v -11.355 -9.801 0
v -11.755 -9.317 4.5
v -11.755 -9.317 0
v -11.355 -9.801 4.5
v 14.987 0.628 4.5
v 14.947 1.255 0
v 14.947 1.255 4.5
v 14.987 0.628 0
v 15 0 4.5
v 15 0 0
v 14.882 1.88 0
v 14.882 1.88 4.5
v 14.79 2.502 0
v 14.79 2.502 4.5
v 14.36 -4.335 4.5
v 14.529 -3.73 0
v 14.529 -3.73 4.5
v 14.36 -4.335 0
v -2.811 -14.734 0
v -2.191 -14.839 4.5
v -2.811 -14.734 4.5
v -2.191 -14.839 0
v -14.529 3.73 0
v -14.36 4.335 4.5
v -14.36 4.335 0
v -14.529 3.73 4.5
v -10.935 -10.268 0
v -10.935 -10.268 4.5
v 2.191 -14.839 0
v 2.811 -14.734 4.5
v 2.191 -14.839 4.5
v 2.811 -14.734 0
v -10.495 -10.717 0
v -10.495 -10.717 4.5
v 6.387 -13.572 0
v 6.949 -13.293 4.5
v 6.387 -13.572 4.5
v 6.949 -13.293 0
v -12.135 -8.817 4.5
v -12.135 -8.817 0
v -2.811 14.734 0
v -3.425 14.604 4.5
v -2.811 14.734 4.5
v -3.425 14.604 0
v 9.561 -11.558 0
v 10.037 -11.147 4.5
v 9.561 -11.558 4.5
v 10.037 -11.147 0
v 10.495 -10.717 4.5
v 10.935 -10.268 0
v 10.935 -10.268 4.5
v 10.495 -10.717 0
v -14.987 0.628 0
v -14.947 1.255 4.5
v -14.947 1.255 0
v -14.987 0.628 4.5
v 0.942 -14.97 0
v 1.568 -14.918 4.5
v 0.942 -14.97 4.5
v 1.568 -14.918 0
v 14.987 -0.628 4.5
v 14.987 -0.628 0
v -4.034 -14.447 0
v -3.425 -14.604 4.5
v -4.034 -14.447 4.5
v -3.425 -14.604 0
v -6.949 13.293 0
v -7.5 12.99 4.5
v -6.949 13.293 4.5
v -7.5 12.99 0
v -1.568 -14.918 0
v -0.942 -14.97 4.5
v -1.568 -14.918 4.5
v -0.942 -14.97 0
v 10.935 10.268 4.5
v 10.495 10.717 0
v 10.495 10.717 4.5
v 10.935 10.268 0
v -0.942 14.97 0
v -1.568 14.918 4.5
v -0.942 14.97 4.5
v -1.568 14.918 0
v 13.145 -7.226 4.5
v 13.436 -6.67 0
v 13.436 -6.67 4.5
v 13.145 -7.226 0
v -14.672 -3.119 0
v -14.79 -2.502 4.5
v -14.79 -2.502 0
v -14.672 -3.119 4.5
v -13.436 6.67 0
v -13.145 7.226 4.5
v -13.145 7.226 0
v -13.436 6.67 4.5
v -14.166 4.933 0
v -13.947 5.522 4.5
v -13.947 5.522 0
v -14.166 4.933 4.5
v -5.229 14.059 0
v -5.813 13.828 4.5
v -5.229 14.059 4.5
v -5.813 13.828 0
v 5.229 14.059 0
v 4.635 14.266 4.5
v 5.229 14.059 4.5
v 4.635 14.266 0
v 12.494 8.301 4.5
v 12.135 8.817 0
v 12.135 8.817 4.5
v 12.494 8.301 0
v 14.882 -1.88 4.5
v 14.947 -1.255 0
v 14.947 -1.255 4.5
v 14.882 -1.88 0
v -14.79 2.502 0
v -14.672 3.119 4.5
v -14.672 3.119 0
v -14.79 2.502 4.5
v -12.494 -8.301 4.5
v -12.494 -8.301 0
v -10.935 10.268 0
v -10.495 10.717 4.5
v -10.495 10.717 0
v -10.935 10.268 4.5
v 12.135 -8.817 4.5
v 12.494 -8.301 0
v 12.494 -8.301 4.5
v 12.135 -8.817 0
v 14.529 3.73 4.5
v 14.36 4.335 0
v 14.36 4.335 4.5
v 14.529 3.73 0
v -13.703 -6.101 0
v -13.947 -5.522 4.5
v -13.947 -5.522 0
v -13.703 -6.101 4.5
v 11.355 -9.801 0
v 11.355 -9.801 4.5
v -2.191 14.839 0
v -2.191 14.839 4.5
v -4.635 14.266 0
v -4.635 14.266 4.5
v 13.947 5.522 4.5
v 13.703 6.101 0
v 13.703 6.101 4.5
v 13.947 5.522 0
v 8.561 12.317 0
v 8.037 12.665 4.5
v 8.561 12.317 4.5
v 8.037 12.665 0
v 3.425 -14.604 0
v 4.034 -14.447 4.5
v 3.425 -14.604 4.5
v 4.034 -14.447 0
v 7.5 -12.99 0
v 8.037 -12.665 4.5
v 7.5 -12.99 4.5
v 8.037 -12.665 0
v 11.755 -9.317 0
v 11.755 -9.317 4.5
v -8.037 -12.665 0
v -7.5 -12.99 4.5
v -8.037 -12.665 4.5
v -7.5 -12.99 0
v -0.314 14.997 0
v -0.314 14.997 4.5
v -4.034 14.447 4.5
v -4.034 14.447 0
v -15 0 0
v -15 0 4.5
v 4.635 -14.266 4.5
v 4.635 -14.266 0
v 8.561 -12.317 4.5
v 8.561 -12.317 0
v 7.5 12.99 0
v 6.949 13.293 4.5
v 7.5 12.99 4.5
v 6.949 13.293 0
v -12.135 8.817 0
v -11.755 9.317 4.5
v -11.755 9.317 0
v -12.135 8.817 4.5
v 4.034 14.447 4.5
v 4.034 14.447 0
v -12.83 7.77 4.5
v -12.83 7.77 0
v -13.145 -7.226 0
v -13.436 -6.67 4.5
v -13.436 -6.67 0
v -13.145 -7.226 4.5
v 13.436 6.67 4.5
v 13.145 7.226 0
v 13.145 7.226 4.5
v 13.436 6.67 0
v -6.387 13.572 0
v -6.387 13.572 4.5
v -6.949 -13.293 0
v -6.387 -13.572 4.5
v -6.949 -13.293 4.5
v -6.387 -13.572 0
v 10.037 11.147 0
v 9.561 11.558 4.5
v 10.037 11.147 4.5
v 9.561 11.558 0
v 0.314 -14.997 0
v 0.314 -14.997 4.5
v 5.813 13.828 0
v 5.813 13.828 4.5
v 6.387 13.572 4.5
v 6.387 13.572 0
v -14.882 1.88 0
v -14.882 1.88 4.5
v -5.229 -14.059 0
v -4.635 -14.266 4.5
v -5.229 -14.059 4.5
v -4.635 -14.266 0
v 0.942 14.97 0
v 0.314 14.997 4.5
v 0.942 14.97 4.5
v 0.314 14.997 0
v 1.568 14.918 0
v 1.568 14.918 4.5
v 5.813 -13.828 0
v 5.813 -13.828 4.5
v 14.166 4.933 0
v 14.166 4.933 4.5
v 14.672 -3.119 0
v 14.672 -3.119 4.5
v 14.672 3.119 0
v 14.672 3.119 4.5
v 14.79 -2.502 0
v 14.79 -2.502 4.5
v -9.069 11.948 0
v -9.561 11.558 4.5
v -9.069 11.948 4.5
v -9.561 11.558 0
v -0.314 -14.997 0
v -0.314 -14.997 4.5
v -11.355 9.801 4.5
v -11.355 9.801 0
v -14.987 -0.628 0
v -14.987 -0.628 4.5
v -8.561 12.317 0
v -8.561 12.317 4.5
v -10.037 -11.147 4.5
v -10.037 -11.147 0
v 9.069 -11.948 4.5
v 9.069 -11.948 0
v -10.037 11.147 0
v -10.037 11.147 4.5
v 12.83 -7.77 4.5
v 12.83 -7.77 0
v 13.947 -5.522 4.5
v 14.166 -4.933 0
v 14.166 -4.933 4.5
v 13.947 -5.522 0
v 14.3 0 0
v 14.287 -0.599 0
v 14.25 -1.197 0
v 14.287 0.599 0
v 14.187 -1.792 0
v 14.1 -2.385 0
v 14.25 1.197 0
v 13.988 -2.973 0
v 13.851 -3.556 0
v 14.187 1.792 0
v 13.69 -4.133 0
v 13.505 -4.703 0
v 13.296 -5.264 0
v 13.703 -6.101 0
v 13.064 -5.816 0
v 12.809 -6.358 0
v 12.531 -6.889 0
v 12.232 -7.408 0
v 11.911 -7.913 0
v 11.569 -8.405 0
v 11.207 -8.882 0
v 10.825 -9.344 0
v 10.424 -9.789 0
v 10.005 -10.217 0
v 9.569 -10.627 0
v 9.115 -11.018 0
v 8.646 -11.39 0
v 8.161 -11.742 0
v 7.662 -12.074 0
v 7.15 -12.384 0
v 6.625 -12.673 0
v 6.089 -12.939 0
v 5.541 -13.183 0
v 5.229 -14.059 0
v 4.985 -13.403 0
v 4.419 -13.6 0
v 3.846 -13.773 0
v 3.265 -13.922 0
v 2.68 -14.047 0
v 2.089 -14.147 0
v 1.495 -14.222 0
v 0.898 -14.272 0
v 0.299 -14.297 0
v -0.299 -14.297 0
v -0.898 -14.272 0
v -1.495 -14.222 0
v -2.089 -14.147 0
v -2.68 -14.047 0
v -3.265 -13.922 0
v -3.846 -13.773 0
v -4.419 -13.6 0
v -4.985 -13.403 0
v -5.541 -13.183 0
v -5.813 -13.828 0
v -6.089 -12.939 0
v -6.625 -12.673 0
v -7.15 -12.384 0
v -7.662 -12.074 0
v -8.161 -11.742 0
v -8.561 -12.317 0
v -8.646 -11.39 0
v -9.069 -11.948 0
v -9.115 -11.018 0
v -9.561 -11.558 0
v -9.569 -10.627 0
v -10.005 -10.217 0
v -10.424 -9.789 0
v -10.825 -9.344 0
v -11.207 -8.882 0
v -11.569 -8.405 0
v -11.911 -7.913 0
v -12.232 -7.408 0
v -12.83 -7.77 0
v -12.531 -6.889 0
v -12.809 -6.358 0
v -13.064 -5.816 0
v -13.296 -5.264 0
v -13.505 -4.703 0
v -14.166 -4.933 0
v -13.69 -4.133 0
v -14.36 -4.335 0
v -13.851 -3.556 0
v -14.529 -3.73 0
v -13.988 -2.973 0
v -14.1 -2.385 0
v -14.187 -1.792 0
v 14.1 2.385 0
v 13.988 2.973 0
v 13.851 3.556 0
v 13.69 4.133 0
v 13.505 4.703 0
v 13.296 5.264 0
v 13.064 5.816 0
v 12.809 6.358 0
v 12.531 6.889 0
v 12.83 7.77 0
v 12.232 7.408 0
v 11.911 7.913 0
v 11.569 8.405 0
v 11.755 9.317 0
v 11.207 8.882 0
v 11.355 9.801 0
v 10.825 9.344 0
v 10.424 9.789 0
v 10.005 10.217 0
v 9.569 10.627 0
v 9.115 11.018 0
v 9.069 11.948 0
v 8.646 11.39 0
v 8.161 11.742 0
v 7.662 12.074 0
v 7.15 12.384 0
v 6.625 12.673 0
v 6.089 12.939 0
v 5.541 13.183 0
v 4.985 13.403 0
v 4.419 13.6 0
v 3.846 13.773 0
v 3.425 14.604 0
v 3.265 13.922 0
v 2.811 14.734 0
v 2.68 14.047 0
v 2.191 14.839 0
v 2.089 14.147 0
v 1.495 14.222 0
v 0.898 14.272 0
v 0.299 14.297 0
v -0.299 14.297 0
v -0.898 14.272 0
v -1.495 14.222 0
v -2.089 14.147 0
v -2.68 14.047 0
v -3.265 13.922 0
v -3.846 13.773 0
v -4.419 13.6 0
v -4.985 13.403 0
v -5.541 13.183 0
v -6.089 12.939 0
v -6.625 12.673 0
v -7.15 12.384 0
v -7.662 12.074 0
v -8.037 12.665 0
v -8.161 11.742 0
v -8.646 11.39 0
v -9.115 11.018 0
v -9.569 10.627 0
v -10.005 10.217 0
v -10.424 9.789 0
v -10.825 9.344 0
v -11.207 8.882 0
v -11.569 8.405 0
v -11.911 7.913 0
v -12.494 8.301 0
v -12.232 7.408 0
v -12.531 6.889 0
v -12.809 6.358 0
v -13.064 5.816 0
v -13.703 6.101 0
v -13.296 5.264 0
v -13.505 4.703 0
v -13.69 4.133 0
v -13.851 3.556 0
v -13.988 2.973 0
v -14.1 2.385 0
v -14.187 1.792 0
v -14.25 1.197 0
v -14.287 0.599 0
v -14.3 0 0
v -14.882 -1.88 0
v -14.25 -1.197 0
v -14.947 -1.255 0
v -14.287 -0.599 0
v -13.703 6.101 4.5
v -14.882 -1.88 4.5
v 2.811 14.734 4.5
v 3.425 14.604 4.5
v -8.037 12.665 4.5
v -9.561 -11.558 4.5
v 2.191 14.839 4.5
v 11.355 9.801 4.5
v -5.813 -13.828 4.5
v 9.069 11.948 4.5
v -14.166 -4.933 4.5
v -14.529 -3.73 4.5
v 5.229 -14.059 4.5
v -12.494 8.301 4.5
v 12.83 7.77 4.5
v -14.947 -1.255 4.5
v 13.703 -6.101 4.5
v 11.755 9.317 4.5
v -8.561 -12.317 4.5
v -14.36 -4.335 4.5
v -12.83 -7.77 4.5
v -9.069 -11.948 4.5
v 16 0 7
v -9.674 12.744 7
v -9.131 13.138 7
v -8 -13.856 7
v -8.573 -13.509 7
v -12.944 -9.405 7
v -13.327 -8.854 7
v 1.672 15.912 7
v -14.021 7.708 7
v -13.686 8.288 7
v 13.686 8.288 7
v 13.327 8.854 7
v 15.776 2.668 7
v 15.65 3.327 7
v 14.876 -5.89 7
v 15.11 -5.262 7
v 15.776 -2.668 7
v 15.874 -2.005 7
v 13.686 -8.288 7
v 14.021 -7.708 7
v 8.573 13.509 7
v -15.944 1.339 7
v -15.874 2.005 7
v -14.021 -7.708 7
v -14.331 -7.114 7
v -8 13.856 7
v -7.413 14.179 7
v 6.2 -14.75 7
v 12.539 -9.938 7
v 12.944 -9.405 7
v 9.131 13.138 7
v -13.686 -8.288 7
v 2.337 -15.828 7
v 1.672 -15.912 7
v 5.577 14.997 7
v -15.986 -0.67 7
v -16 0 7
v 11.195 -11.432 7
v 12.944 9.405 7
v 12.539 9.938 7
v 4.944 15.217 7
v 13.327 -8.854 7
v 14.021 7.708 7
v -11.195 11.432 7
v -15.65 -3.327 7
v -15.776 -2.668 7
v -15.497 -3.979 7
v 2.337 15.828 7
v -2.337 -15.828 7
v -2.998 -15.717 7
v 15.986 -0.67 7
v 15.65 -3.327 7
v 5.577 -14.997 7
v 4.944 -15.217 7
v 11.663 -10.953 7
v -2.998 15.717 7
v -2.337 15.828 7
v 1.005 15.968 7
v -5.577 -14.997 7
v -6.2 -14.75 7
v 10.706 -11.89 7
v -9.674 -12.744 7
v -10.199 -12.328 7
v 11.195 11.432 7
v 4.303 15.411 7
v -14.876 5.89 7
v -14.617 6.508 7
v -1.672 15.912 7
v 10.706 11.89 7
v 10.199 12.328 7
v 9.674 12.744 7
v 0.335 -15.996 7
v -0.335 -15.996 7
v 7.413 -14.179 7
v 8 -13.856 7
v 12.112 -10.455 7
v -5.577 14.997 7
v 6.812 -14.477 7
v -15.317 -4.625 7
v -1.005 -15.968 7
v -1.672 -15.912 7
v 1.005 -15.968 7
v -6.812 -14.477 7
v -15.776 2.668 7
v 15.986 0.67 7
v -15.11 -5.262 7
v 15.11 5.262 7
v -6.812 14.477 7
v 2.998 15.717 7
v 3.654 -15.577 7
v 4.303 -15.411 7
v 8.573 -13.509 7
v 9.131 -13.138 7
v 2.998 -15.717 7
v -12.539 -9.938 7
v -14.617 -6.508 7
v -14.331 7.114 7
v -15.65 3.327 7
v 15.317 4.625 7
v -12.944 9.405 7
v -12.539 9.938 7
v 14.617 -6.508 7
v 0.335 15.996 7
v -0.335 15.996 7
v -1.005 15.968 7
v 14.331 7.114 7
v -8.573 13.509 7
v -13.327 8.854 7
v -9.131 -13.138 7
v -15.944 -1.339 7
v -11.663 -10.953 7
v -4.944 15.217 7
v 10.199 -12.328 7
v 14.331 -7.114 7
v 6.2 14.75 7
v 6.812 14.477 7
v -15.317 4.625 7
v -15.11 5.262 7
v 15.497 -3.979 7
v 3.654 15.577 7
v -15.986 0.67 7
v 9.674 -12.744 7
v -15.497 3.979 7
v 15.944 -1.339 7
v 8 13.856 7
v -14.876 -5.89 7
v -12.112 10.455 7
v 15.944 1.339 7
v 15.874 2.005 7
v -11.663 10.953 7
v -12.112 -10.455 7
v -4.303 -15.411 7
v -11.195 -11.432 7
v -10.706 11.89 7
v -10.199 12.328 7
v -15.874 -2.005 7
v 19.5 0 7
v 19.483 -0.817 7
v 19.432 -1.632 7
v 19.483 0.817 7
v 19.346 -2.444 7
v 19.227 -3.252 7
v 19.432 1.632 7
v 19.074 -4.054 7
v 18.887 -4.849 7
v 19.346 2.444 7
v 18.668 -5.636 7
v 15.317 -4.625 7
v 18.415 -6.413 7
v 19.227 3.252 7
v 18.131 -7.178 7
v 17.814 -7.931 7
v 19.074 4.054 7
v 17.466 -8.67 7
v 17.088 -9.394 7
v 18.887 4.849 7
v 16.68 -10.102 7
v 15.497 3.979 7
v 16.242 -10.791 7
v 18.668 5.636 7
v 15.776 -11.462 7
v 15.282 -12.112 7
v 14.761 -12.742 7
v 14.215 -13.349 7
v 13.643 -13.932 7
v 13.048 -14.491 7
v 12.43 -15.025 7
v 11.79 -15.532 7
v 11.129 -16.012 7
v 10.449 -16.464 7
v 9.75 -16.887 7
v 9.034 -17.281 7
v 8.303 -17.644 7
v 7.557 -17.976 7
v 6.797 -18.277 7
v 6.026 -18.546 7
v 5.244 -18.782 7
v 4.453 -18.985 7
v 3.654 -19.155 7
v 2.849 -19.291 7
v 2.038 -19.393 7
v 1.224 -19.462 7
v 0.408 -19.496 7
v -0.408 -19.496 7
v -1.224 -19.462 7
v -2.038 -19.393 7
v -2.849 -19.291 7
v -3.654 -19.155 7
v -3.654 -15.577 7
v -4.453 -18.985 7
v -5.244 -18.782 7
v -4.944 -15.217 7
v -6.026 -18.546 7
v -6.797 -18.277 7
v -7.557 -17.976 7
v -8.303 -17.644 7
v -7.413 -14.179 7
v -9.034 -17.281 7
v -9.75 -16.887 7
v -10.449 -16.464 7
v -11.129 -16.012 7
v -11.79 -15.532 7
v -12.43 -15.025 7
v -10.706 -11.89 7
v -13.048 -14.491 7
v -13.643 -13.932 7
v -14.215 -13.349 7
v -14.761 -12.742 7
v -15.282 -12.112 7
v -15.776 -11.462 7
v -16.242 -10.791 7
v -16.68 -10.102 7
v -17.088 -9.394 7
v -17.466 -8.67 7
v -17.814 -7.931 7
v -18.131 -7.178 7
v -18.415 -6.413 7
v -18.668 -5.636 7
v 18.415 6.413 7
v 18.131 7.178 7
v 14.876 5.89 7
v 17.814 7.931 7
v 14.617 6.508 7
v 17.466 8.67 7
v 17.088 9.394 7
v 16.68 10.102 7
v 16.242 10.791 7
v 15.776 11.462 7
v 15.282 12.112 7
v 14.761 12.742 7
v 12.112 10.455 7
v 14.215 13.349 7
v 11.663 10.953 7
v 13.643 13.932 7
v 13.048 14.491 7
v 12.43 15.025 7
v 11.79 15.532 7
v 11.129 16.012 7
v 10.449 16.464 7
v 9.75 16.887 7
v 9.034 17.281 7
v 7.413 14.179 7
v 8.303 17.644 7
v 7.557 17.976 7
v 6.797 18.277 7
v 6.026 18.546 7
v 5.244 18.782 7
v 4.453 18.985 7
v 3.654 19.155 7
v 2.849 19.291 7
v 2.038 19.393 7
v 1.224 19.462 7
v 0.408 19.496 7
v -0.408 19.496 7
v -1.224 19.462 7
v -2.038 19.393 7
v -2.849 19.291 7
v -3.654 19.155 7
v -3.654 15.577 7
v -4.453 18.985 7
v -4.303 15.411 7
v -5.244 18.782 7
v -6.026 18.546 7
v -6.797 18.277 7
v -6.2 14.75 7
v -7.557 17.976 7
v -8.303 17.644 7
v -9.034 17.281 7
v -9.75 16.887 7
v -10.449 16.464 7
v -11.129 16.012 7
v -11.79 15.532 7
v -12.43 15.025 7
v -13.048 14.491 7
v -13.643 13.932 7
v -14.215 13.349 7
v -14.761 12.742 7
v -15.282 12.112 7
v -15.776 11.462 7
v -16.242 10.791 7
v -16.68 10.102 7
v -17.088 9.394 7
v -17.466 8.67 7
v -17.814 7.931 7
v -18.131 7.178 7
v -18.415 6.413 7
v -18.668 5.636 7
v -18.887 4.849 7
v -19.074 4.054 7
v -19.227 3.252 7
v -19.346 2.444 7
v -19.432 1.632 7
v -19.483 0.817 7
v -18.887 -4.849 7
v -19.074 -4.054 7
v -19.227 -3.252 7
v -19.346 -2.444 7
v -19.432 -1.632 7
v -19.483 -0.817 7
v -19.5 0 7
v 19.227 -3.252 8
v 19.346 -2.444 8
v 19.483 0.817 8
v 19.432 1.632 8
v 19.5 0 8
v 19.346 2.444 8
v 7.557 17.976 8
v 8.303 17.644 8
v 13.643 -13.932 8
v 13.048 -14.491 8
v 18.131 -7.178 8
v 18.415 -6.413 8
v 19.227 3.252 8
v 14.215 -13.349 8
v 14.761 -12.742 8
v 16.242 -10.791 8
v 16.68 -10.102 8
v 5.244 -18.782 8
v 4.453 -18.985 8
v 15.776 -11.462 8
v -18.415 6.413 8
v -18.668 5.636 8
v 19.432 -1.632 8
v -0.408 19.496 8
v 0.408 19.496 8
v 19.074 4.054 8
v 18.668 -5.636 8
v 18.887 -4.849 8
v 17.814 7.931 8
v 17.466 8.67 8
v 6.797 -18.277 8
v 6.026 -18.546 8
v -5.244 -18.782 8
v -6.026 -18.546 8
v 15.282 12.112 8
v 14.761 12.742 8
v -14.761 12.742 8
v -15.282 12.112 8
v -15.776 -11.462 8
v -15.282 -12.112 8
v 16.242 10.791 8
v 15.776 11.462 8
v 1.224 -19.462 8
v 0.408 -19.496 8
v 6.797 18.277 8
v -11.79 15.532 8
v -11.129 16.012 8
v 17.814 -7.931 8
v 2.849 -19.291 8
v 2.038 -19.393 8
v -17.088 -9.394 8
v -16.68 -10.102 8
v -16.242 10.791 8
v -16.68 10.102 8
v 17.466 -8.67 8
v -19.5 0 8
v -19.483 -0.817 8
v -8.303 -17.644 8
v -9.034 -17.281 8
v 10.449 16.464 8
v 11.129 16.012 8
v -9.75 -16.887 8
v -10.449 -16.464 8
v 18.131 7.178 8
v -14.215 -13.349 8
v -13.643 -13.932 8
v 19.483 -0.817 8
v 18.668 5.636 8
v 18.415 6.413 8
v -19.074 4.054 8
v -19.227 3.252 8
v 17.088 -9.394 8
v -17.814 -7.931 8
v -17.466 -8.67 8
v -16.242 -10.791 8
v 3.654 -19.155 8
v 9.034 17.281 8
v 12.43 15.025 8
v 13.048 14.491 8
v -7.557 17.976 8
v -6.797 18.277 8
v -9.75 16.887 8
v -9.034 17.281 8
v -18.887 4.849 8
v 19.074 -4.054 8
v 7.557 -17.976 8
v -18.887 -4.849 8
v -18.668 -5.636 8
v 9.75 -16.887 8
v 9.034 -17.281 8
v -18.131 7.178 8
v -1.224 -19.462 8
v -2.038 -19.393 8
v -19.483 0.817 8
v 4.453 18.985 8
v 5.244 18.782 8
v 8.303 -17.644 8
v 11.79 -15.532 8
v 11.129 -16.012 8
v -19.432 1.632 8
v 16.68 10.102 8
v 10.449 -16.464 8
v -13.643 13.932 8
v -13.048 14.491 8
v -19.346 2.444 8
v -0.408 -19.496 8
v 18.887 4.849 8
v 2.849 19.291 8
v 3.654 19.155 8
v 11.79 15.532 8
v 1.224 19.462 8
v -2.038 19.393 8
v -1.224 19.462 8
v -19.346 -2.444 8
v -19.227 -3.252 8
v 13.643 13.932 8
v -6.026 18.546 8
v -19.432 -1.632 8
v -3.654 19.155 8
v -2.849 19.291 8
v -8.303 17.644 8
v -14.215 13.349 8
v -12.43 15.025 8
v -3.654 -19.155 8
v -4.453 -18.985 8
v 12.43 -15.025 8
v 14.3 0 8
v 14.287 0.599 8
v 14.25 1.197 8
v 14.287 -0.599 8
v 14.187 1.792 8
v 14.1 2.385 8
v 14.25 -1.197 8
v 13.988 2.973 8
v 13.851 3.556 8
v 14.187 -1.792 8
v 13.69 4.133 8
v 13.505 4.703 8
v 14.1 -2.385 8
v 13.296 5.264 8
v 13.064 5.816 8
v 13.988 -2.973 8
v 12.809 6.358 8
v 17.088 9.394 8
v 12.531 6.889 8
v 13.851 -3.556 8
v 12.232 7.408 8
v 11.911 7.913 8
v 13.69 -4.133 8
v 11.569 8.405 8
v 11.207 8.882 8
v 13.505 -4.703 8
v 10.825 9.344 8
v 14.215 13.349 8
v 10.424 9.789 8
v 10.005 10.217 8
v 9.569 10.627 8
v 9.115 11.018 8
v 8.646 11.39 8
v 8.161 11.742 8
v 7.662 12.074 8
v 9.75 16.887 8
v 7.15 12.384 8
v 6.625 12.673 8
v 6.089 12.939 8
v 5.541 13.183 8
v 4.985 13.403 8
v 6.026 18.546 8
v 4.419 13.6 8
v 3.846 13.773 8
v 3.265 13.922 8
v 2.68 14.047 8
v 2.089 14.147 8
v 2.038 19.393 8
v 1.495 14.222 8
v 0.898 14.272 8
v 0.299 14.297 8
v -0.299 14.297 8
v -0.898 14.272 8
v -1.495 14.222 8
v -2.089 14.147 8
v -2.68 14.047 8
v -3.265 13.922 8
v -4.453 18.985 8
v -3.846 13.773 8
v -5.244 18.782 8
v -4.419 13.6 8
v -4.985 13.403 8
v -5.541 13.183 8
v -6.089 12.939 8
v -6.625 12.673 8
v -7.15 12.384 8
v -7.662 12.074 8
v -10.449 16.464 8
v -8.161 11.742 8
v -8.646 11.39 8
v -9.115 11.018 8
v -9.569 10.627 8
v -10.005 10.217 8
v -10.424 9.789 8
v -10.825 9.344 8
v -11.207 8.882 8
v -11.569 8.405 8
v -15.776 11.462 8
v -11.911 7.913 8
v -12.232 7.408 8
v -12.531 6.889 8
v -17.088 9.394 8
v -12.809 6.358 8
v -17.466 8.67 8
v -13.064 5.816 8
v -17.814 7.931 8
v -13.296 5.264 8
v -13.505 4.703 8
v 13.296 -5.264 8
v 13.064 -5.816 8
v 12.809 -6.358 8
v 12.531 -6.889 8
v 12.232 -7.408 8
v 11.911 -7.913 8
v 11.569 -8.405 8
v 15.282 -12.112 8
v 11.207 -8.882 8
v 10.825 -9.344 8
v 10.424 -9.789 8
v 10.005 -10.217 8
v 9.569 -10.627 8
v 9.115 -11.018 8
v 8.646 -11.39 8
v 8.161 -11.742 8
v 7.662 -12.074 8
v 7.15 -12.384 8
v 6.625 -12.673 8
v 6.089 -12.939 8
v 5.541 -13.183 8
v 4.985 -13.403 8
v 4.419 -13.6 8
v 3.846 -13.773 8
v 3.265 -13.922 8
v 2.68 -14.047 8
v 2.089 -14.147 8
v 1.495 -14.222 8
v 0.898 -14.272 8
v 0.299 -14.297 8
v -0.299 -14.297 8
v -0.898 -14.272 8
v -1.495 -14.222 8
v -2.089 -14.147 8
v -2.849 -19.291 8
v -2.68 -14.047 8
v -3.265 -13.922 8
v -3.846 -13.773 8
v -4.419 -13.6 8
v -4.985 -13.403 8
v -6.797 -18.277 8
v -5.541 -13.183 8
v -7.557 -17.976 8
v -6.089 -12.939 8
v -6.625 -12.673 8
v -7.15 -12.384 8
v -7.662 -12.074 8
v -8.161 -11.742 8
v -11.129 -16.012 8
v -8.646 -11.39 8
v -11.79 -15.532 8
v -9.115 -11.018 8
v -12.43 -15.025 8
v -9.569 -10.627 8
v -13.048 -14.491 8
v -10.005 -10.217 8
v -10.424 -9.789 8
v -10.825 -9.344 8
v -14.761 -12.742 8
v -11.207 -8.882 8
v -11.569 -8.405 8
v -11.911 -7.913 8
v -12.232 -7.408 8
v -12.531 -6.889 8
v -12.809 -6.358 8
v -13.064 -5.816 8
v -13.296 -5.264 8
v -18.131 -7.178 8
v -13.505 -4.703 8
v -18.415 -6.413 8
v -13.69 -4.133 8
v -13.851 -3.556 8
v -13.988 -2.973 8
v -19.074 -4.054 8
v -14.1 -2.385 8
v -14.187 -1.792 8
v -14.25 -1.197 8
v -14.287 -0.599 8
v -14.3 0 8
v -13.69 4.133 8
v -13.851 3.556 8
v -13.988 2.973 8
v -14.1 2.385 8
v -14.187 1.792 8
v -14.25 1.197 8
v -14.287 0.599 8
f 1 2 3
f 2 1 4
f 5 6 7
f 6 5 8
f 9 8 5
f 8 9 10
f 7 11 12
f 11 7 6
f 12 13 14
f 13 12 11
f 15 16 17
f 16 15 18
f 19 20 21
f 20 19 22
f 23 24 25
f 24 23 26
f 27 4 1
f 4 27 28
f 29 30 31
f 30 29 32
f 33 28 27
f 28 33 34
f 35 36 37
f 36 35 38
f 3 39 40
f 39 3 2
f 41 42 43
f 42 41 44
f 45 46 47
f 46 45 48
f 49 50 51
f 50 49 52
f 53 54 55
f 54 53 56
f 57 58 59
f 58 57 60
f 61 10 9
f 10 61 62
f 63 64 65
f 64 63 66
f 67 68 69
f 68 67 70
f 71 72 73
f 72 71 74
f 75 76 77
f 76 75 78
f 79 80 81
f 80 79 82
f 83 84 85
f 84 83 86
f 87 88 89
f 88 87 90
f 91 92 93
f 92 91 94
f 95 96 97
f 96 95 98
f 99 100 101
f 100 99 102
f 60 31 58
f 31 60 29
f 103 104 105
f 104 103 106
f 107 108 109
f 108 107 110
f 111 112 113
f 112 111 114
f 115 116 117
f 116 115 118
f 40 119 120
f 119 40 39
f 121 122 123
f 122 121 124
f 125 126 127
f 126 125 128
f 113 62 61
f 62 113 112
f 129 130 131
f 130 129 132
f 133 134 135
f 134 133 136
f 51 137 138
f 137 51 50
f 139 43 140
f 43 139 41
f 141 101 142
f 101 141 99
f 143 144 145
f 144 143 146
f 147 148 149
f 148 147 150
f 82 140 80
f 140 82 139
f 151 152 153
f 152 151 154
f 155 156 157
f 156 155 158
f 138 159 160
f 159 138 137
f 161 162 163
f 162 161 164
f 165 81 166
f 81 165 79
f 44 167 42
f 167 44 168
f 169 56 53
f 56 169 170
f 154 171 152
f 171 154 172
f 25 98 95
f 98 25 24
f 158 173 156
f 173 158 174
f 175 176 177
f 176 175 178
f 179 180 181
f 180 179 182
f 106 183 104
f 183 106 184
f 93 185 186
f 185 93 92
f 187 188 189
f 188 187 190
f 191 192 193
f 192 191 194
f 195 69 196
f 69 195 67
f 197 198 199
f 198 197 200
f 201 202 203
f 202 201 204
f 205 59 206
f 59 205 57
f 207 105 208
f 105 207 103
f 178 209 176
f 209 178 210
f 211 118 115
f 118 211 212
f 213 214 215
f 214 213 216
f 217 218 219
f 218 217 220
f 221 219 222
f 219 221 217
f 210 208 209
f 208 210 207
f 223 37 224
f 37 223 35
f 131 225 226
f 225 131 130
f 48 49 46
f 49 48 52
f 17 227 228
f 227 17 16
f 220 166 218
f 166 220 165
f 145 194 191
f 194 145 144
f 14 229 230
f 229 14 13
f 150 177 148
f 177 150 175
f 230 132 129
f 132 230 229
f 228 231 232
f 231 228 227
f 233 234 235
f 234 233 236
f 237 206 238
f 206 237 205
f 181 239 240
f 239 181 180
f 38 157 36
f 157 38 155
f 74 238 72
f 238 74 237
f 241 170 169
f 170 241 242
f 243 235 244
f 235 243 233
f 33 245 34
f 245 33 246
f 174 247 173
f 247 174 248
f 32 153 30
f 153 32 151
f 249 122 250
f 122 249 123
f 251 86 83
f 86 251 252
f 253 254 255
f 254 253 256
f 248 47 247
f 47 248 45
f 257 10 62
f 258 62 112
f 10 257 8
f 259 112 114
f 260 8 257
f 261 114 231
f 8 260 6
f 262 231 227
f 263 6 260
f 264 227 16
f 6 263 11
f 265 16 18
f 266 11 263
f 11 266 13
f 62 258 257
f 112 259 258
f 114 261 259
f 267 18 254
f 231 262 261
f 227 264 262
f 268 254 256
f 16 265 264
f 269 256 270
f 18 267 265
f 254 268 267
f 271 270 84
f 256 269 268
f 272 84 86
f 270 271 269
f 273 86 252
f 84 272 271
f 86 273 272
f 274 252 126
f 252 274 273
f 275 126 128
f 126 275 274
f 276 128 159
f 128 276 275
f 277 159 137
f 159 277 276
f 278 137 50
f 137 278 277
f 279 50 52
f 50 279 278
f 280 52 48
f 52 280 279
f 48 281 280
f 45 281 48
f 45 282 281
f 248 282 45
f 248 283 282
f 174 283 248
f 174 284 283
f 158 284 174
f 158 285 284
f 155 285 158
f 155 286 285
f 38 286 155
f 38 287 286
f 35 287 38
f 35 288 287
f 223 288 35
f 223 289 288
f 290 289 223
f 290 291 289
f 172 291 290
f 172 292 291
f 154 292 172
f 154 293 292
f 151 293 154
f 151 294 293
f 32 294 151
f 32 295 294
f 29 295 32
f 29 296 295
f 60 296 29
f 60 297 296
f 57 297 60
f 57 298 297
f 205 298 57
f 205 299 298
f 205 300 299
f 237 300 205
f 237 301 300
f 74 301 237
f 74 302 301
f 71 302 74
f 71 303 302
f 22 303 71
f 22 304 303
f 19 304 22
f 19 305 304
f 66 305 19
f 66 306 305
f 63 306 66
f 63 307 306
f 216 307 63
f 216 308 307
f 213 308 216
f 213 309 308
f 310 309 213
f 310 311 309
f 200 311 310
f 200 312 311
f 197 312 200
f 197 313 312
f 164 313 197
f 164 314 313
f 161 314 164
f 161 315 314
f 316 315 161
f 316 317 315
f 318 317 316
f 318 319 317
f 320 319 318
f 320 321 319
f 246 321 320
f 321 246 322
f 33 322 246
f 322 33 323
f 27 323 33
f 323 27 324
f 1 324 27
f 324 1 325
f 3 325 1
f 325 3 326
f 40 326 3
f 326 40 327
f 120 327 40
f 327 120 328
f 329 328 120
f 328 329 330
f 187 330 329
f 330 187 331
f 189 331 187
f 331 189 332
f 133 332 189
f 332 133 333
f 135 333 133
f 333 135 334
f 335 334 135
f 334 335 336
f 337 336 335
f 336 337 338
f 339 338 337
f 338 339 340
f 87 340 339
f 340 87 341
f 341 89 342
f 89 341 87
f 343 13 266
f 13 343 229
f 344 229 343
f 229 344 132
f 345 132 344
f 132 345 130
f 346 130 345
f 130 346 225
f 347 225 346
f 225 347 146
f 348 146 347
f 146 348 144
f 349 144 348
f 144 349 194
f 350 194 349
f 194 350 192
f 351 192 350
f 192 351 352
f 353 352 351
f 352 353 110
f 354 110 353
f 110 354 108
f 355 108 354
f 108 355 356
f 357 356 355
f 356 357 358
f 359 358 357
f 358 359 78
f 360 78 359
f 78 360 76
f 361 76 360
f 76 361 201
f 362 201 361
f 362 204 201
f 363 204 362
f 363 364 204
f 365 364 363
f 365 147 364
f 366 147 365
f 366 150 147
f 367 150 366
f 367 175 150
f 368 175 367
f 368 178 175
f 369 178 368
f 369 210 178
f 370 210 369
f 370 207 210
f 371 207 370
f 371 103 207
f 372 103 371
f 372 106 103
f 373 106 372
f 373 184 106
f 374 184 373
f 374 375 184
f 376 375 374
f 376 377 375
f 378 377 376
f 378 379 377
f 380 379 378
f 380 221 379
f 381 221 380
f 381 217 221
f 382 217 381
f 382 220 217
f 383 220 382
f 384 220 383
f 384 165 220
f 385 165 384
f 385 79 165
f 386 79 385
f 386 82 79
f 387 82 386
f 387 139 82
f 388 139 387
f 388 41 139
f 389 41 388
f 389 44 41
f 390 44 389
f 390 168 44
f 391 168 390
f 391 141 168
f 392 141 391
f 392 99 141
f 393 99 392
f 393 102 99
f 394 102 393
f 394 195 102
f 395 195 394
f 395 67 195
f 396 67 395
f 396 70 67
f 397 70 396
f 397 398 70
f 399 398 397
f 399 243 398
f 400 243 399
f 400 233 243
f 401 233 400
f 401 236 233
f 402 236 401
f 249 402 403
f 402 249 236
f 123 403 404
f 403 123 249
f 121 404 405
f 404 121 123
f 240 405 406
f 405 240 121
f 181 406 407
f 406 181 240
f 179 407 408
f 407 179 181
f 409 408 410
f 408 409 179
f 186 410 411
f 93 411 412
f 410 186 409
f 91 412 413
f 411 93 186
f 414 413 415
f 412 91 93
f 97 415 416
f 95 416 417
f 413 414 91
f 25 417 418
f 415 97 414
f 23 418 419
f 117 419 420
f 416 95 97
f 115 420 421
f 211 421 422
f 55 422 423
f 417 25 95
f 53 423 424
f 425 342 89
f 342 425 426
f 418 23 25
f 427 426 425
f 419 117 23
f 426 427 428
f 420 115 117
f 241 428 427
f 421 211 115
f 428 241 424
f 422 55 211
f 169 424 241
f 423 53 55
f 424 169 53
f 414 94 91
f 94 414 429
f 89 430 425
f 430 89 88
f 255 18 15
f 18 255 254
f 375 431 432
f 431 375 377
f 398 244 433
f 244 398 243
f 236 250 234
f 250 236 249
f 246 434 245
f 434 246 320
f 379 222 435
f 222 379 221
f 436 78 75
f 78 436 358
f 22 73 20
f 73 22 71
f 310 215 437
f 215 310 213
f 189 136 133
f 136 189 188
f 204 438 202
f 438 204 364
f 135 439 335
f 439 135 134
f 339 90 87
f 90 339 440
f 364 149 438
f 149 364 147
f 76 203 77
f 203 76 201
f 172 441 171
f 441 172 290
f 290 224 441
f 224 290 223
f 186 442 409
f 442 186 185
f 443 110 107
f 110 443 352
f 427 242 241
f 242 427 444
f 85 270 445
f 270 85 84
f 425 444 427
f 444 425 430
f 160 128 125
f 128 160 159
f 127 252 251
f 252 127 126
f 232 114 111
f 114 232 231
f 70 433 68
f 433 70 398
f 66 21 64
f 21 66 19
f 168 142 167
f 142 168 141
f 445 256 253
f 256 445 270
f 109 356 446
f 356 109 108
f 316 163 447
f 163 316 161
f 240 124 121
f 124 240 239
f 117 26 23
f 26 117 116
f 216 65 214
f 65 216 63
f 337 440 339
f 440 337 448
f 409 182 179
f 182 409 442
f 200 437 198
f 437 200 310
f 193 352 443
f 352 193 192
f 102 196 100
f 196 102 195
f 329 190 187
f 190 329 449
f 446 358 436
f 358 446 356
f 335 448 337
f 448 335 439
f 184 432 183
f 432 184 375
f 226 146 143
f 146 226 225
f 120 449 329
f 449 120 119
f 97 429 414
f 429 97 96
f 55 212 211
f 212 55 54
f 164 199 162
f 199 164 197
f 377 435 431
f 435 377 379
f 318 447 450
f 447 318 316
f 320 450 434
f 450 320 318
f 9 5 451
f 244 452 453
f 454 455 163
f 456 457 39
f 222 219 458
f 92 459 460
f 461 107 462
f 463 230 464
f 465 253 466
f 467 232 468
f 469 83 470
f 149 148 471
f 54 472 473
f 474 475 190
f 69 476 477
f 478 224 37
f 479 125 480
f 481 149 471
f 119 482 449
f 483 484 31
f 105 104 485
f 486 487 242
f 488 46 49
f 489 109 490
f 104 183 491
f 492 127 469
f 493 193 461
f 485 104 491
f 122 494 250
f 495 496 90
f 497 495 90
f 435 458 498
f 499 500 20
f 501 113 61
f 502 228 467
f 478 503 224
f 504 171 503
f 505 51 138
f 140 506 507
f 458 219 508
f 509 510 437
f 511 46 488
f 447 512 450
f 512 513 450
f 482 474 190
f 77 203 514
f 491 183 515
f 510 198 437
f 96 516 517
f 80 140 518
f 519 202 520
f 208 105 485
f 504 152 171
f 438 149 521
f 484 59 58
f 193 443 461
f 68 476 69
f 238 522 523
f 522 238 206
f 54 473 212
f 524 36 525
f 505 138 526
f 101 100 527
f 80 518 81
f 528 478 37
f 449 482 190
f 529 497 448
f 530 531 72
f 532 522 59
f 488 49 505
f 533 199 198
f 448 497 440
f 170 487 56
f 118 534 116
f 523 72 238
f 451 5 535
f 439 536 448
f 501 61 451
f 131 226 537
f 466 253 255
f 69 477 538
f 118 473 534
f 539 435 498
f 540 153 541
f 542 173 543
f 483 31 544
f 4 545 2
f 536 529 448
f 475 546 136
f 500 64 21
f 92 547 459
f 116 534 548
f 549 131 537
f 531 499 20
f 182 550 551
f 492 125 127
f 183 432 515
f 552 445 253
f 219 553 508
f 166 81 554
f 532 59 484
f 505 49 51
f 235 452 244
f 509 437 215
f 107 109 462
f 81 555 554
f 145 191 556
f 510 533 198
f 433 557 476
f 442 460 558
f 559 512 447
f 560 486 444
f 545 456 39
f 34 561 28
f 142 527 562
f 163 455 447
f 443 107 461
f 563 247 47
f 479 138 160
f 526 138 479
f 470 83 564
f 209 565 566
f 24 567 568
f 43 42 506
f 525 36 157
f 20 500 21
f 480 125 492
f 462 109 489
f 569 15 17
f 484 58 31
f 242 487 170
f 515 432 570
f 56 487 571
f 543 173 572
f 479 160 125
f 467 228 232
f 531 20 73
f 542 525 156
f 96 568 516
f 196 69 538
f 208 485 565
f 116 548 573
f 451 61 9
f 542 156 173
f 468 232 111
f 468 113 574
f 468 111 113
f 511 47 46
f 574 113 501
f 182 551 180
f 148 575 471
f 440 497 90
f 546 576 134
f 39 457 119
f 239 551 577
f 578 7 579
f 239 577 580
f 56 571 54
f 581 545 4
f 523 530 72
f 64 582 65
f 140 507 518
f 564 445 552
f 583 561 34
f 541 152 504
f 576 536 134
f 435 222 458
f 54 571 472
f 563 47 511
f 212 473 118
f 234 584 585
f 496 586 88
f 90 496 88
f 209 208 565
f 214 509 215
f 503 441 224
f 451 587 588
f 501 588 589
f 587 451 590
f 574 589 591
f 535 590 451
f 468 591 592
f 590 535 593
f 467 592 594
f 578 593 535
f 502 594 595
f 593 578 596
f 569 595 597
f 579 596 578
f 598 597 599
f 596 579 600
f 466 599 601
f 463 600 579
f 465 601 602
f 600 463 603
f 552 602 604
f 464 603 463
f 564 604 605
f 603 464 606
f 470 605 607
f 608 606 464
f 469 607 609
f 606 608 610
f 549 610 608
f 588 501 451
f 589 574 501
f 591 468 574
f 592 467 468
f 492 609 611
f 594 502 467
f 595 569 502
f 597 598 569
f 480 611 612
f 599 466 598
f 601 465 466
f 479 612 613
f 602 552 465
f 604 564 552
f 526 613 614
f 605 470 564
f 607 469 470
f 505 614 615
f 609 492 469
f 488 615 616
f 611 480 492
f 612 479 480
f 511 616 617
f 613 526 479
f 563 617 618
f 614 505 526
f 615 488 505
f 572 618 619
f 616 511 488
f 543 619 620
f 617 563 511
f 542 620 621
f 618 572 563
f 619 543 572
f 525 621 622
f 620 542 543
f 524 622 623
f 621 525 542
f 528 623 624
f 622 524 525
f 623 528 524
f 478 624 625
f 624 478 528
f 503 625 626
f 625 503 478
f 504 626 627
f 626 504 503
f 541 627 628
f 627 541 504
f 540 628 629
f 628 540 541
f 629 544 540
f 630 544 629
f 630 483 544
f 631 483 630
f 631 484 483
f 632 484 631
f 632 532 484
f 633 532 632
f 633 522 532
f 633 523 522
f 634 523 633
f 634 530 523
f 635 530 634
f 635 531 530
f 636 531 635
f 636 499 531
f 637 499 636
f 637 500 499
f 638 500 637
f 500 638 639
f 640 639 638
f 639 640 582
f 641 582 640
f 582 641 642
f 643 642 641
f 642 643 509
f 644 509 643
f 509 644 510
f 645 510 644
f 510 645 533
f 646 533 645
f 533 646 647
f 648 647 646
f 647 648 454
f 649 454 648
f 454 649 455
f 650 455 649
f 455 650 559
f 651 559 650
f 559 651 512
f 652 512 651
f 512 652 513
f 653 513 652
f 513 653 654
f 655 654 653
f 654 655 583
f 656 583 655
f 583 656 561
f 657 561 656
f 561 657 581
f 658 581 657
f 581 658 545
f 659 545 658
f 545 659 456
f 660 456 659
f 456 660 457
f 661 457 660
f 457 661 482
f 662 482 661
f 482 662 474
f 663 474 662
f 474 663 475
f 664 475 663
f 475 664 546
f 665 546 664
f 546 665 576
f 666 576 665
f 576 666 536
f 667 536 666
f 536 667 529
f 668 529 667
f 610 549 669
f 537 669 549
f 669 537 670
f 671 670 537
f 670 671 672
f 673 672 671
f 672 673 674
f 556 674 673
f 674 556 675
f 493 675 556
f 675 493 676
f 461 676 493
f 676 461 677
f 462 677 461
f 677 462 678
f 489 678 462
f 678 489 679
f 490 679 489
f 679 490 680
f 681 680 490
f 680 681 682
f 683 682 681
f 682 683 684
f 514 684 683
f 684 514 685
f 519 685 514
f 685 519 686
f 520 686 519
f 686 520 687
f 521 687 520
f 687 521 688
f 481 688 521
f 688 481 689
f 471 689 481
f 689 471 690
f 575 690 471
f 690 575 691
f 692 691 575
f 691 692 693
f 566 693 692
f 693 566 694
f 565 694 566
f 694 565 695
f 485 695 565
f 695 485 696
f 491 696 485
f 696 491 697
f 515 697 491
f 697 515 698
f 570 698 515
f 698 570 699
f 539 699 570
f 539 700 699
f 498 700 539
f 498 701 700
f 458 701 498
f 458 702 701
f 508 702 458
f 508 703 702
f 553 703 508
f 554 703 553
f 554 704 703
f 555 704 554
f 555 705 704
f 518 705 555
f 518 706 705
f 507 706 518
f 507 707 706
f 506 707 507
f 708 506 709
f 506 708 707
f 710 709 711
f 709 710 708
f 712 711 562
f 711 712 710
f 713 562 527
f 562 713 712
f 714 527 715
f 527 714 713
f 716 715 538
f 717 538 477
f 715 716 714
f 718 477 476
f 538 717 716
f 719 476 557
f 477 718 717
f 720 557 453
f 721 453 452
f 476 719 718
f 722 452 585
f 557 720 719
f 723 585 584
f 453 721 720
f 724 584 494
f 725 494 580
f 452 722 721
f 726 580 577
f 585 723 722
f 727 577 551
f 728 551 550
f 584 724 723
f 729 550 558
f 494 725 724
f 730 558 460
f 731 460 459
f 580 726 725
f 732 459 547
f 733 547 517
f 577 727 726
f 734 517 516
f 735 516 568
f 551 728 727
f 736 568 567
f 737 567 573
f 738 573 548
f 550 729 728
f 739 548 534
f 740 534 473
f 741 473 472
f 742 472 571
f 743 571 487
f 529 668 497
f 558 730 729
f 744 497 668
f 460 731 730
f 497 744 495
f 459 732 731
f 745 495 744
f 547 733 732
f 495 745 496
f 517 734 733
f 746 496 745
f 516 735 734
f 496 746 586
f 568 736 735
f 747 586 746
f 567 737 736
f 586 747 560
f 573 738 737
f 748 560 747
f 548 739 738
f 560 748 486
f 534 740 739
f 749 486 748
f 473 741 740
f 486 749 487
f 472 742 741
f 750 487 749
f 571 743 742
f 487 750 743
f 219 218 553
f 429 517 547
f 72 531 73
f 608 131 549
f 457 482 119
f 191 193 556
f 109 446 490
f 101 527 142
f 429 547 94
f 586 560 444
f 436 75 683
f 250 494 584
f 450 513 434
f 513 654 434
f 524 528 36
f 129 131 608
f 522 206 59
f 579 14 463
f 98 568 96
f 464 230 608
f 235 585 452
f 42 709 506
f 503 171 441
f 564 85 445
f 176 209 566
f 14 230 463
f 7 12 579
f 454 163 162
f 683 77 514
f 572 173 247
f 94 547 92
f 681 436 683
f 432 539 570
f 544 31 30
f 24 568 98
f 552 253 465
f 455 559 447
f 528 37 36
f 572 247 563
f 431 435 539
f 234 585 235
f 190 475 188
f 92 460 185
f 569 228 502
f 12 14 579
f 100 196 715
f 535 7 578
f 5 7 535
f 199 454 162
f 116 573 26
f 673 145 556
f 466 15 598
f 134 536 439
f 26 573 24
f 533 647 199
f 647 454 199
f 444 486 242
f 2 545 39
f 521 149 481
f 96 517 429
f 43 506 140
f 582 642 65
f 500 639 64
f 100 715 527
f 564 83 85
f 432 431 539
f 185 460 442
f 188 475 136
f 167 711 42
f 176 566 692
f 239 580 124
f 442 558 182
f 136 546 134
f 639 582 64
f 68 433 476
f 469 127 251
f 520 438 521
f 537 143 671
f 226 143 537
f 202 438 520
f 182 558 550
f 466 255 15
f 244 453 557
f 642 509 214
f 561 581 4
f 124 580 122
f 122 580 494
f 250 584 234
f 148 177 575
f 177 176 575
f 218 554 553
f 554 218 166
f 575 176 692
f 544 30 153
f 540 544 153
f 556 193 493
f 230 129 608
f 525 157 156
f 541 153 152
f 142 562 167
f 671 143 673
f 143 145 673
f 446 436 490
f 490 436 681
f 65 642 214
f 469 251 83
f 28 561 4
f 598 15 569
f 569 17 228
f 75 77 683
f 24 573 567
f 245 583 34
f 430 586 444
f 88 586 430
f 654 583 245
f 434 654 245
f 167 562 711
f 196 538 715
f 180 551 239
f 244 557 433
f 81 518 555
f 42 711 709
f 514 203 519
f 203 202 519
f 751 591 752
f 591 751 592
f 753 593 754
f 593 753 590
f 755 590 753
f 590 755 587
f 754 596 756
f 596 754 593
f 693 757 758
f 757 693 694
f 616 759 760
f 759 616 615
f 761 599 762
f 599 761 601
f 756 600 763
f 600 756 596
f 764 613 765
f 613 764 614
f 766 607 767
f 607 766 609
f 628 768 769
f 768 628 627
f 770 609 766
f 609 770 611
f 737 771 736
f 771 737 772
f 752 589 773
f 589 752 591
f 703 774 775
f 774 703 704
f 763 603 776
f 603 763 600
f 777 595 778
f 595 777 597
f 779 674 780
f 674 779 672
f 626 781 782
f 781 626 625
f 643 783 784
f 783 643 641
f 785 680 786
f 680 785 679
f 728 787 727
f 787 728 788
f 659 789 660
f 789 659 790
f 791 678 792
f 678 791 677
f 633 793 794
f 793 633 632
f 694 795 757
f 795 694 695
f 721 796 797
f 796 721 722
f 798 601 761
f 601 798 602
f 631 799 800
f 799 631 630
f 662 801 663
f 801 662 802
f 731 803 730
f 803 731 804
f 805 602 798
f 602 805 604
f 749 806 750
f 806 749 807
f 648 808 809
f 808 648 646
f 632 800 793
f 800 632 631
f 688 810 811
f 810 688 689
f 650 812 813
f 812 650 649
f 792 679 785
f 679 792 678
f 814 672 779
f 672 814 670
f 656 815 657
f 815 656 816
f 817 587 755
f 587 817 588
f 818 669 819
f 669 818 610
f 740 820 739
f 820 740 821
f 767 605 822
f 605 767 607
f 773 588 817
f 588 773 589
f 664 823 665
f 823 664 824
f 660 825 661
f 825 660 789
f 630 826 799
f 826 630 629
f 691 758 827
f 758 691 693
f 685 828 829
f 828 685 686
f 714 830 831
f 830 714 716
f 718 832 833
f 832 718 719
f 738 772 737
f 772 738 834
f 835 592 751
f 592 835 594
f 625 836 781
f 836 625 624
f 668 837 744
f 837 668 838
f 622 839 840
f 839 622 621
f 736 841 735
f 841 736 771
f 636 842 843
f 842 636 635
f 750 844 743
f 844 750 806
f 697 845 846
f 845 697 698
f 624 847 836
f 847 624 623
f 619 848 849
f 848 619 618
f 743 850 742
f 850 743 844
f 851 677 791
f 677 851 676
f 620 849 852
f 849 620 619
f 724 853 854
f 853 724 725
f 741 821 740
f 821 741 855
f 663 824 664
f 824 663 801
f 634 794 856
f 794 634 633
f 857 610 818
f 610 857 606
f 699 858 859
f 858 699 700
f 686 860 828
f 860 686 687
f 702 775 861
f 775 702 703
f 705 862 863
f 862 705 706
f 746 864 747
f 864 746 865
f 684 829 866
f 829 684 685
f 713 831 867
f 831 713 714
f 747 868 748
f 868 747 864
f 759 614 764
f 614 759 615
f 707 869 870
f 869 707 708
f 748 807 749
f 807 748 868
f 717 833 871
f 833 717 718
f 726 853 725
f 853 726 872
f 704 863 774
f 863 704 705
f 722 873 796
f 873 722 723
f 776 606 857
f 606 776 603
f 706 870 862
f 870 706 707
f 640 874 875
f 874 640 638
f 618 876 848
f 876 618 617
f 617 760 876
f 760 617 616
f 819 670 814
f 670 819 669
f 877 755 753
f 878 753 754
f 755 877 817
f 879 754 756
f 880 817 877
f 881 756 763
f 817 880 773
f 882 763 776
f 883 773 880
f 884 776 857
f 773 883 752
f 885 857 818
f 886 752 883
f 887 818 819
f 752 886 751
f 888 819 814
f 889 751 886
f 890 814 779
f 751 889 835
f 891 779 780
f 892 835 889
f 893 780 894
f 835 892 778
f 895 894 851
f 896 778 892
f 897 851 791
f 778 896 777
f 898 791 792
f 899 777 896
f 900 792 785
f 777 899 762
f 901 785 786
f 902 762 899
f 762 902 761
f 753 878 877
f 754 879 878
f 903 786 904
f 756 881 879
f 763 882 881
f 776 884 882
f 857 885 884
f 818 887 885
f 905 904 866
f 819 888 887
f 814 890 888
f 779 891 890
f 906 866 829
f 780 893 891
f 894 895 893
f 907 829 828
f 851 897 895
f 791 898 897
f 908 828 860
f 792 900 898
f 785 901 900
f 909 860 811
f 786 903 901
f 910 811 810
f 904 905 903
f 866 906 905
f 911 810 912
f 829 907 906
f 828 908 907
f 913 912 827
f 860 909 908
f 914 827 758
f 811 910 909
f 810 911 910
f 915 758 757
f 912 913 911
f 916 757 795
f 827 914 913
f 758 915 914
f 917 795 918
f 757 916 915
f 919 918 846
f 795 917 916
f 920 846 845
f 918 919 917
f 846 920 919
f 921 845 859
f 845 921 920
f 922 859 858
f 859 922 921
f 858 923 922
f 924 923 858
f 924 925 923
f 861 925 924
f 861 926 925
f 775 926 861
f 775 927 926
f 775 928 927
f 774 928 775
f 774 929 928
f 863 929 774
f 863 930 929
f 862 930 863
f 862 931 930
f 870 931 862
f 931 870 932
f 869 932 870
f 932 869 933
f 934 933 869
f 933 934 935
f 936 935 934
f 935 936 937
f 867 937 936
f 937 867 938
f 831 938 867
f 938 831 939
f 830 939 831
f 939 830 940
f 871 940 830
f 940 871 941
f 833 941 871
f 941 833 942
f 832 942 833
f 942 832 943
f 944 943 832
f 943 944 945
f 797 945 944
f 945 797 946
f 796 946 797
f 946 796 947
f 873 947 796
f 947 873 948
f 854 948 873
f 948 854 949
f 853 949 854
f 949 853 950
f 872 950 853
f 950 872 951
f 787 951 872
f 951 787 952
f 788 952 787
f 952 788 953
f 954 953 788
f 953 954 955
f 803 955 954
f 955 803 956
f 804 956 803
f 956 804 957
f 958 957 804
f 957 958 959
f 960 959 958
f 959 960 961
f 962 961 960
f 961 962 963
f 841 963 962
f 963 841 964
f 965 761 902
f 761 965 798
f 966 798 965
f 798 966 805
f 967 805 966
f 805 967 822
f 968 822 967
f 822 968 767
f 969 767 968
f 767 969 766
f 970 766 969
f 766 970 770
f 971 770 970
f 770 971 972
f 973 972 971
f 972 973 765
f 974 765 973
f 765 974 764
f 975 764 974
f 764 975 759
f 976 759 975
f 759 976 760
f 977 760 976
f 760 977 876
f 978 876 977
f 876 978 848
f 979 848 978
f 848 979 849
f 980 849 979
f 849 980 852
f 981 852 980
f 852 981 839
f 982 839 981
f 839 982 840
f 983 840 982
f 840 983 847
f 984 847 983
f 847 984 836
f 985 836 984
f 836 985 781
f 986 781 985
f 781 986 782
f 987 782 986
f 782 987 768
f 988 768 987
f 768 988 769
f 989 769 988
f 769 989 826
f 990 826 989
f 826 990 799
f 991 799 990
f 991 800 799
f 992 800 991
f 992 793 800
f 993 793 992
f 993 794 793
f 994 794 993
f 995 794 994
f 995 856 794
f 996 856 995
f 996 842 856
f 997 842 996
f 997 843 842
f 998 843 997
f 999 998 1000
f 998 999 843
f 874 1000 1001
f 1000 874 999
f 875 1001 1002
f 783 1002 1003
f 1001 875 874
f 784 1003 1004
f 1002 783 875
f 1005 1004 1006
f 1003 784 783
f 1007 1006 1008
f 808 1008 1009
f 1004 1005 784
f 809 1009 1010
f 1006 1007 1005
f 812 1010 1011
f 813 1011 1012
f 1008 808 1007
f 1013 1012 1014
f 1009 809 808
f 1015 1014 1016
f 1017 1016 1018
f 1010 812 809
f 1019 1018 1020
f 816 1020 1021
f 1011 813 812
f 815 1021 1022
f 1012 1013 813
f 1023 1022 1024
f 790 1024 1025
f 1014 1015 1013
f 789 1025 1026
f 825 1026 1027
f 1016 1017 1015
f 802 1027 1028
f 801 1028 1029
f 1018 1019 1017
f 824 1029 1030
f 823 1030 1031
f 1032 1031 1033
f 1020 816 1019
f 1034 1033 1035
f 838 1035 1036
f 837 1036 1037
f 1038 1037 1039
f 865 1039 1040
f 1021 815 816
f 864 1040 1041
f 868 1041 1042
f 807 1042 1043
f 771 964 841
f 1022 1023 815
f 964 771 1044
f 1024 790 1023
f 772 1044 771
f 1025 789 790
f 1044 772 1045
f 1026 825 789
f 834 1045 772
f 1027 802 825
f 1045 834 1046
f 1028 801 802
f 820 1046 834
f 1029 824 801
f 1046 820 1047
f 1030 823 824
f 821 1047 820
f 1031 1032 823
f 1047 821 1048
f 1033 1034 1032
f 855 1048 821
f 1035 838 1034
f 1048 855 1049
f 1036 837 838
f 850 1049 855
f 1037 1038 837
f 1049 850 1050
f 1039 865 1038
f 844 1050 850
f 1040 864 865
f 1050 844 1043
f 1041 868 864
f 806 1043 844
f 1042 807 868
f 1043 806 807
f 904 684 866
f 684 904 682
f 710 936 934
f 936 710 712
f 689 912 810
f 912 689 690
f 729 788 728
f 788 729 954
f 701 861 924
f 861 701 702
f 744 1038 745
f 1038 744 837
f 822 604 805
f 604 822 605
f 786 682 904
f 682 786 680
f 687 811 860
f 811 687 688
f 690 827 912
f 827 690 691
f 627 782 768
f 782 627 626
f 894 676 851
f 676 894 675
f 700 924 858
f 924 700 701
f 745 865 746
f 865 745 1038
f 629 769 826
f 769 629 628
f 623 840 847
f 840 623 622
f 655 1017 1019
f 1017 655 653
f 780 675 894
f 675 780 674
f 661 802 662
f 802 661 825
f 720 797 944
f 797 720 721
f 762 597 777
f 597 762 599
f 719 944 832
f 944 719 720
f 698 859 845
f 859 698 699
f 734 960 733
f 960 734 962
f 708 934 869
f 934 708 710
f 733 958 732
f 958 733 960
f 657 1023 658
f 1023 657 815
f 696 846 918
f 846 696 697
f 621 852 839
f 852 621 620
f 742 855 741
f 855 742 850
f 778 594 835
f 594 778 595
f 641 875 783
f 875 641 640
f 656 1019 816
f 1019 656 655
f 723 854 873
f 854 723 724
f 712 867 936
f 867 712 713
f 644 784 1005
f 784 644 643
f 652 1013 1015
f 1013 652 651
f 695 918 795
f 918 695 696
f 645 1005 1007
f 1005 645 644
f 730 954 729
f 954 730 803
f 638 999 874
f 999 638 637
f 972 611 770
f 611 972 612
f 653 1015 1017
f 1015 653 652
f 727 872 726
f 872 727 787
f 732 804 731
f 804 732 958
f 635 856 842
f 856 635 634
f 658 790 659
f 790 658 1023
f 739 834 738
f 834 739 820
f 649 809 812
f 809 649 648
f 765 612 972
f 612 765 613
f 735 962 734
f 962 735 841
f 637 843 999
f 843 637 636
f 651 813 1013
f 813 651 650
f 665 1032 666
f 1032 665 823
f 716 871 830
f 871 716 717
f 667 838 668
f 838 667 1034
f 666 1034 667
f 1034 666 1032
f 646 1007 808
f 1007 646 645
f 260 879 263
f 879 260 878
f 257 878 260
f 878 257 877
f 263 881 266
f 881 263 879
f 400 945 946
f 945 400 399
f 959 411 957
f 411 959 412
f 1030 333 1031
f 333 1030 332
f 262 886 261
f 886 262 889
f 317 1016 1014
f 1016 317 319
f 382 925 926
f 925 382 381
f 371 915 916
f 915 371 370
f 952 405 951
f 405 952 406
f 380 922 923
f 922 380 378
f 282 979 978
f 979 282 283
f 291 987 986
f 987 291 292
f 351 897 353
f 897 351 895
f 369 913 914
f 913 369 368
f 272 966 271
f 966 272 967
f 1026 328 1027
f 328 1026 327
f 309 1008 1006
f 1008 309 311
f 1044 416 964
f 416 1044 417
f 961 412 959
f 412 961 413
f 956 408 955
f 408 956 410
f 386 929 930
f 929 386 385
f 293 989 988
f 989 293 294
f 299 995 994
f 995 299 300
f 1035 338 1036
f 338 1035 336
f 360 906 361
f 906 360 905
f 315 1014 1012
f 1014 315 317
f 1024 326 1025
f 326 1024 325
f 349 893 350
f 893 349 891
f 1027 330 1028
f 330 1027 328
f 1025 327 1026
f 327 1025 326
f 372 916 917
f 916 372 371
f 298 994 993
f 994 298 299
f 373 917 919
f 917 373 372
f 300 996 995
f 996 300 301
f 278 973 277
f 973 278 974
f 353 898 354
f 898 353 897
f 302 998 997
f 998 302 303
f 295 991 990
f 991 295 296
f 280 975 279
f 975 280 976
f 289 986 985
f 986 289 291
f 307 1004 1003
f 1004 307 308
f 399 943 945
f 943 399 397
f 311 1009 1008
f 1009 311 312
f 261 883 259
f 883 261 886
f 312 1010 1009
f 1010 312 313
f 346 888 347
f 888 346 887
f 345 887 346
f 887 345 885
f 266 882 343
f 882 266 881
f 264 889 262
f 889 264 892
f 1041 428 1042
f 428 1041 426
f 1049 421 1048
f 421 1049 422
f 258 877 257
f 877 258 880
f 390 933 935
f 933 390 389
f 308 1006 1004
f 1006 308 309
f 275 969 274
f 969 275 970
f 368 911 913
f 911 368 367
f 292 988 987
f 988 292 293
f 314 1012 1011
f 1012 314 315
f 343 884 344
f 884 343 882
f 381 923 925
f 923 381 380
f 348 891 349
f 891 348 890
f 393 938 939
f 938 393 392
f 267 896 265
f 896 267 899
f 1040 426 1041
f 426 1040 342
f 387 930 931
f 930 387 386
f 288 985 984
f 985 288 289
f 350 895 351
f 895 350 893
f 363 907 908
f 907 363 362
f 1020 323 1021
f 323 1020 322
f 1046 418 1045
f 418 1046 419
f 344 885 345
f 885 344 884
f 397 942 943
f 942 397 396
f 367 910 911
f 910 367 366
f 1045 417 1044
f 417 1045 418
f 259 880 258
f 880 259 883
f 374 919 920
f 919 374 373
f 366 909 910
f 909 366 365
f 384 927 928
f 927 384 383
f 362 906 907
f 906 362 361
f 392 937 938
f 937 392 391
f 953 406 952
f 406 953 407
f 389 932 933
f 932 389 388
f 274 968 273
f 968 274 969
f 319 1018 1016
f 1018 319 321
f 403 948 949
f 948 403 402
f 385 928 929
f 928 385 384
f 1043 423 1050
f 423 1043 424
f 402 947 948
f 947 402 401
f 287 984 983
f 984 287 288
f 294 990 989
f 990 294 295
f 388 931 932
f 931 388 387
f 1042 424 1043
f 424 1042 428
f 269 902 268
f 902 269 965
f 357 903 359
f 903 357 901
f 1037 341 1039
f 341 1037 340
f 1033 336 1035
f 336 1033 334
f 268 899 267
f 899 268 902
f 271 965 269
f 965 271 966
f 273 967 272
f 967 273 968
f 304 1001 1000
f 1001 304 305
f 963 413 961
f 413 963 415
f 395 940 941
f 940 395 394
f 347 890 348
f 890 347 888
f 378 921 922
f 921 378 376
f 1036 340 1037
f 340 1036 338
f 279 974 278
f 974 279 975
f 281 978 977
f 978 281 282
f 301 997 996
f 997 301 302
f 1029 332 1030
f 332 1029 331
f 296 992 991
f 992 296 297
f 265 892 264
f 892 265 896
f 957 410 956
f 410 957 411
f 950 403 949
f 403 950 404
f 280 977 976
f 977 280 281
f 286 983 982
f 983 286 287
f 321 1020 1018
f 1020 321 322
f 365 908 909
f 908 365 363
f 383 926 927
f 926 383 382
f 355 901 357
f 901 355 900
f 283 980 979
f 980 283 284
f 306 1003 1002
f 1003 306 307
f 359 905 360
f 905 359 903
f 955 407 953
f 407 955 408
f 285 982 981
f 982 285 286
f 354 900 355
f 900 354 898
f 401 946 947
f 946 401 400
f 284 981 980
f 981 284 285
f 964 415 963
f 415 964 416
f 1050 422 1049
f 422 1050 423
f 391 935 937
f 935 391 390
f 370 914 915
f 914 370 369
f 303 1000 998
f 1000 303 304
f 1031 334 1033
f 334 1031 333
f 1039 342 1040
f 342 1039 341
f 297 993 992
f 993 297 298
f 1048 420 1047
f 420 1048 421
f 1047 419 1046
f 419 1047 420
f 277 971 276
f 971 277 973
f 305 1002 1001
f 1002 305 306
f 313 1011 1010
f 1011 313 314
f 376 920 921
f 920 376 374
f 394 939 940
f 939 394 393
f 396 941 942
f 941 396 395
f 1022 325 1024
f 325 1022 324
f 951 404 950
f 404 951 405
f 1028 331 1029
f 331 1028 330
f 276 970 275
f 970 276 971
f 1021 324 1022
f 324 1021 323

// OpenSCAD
$fn = 150;

module fork() { translate([0, 0, -15]) cylinder(h=50, d=28.6); }

module top_washer()
difference()
{	union()
	{	cylinder(d=30, h=4.5);
		translate([0,0,4.5]) cylinder(d1=30, d2=32, h=2.5);
		translate([0, 0, 7]) cylinder(d=39, h=1);
	}
	fork();
}

module bottom_washer()
difference()
{	union()
	{	cylinder(d=30, h=2);
		translate([0, 0, 2]) cylinder(d=33.5, h=6);
	}
	fork();
}

top_washer();
*bottom_washer();
